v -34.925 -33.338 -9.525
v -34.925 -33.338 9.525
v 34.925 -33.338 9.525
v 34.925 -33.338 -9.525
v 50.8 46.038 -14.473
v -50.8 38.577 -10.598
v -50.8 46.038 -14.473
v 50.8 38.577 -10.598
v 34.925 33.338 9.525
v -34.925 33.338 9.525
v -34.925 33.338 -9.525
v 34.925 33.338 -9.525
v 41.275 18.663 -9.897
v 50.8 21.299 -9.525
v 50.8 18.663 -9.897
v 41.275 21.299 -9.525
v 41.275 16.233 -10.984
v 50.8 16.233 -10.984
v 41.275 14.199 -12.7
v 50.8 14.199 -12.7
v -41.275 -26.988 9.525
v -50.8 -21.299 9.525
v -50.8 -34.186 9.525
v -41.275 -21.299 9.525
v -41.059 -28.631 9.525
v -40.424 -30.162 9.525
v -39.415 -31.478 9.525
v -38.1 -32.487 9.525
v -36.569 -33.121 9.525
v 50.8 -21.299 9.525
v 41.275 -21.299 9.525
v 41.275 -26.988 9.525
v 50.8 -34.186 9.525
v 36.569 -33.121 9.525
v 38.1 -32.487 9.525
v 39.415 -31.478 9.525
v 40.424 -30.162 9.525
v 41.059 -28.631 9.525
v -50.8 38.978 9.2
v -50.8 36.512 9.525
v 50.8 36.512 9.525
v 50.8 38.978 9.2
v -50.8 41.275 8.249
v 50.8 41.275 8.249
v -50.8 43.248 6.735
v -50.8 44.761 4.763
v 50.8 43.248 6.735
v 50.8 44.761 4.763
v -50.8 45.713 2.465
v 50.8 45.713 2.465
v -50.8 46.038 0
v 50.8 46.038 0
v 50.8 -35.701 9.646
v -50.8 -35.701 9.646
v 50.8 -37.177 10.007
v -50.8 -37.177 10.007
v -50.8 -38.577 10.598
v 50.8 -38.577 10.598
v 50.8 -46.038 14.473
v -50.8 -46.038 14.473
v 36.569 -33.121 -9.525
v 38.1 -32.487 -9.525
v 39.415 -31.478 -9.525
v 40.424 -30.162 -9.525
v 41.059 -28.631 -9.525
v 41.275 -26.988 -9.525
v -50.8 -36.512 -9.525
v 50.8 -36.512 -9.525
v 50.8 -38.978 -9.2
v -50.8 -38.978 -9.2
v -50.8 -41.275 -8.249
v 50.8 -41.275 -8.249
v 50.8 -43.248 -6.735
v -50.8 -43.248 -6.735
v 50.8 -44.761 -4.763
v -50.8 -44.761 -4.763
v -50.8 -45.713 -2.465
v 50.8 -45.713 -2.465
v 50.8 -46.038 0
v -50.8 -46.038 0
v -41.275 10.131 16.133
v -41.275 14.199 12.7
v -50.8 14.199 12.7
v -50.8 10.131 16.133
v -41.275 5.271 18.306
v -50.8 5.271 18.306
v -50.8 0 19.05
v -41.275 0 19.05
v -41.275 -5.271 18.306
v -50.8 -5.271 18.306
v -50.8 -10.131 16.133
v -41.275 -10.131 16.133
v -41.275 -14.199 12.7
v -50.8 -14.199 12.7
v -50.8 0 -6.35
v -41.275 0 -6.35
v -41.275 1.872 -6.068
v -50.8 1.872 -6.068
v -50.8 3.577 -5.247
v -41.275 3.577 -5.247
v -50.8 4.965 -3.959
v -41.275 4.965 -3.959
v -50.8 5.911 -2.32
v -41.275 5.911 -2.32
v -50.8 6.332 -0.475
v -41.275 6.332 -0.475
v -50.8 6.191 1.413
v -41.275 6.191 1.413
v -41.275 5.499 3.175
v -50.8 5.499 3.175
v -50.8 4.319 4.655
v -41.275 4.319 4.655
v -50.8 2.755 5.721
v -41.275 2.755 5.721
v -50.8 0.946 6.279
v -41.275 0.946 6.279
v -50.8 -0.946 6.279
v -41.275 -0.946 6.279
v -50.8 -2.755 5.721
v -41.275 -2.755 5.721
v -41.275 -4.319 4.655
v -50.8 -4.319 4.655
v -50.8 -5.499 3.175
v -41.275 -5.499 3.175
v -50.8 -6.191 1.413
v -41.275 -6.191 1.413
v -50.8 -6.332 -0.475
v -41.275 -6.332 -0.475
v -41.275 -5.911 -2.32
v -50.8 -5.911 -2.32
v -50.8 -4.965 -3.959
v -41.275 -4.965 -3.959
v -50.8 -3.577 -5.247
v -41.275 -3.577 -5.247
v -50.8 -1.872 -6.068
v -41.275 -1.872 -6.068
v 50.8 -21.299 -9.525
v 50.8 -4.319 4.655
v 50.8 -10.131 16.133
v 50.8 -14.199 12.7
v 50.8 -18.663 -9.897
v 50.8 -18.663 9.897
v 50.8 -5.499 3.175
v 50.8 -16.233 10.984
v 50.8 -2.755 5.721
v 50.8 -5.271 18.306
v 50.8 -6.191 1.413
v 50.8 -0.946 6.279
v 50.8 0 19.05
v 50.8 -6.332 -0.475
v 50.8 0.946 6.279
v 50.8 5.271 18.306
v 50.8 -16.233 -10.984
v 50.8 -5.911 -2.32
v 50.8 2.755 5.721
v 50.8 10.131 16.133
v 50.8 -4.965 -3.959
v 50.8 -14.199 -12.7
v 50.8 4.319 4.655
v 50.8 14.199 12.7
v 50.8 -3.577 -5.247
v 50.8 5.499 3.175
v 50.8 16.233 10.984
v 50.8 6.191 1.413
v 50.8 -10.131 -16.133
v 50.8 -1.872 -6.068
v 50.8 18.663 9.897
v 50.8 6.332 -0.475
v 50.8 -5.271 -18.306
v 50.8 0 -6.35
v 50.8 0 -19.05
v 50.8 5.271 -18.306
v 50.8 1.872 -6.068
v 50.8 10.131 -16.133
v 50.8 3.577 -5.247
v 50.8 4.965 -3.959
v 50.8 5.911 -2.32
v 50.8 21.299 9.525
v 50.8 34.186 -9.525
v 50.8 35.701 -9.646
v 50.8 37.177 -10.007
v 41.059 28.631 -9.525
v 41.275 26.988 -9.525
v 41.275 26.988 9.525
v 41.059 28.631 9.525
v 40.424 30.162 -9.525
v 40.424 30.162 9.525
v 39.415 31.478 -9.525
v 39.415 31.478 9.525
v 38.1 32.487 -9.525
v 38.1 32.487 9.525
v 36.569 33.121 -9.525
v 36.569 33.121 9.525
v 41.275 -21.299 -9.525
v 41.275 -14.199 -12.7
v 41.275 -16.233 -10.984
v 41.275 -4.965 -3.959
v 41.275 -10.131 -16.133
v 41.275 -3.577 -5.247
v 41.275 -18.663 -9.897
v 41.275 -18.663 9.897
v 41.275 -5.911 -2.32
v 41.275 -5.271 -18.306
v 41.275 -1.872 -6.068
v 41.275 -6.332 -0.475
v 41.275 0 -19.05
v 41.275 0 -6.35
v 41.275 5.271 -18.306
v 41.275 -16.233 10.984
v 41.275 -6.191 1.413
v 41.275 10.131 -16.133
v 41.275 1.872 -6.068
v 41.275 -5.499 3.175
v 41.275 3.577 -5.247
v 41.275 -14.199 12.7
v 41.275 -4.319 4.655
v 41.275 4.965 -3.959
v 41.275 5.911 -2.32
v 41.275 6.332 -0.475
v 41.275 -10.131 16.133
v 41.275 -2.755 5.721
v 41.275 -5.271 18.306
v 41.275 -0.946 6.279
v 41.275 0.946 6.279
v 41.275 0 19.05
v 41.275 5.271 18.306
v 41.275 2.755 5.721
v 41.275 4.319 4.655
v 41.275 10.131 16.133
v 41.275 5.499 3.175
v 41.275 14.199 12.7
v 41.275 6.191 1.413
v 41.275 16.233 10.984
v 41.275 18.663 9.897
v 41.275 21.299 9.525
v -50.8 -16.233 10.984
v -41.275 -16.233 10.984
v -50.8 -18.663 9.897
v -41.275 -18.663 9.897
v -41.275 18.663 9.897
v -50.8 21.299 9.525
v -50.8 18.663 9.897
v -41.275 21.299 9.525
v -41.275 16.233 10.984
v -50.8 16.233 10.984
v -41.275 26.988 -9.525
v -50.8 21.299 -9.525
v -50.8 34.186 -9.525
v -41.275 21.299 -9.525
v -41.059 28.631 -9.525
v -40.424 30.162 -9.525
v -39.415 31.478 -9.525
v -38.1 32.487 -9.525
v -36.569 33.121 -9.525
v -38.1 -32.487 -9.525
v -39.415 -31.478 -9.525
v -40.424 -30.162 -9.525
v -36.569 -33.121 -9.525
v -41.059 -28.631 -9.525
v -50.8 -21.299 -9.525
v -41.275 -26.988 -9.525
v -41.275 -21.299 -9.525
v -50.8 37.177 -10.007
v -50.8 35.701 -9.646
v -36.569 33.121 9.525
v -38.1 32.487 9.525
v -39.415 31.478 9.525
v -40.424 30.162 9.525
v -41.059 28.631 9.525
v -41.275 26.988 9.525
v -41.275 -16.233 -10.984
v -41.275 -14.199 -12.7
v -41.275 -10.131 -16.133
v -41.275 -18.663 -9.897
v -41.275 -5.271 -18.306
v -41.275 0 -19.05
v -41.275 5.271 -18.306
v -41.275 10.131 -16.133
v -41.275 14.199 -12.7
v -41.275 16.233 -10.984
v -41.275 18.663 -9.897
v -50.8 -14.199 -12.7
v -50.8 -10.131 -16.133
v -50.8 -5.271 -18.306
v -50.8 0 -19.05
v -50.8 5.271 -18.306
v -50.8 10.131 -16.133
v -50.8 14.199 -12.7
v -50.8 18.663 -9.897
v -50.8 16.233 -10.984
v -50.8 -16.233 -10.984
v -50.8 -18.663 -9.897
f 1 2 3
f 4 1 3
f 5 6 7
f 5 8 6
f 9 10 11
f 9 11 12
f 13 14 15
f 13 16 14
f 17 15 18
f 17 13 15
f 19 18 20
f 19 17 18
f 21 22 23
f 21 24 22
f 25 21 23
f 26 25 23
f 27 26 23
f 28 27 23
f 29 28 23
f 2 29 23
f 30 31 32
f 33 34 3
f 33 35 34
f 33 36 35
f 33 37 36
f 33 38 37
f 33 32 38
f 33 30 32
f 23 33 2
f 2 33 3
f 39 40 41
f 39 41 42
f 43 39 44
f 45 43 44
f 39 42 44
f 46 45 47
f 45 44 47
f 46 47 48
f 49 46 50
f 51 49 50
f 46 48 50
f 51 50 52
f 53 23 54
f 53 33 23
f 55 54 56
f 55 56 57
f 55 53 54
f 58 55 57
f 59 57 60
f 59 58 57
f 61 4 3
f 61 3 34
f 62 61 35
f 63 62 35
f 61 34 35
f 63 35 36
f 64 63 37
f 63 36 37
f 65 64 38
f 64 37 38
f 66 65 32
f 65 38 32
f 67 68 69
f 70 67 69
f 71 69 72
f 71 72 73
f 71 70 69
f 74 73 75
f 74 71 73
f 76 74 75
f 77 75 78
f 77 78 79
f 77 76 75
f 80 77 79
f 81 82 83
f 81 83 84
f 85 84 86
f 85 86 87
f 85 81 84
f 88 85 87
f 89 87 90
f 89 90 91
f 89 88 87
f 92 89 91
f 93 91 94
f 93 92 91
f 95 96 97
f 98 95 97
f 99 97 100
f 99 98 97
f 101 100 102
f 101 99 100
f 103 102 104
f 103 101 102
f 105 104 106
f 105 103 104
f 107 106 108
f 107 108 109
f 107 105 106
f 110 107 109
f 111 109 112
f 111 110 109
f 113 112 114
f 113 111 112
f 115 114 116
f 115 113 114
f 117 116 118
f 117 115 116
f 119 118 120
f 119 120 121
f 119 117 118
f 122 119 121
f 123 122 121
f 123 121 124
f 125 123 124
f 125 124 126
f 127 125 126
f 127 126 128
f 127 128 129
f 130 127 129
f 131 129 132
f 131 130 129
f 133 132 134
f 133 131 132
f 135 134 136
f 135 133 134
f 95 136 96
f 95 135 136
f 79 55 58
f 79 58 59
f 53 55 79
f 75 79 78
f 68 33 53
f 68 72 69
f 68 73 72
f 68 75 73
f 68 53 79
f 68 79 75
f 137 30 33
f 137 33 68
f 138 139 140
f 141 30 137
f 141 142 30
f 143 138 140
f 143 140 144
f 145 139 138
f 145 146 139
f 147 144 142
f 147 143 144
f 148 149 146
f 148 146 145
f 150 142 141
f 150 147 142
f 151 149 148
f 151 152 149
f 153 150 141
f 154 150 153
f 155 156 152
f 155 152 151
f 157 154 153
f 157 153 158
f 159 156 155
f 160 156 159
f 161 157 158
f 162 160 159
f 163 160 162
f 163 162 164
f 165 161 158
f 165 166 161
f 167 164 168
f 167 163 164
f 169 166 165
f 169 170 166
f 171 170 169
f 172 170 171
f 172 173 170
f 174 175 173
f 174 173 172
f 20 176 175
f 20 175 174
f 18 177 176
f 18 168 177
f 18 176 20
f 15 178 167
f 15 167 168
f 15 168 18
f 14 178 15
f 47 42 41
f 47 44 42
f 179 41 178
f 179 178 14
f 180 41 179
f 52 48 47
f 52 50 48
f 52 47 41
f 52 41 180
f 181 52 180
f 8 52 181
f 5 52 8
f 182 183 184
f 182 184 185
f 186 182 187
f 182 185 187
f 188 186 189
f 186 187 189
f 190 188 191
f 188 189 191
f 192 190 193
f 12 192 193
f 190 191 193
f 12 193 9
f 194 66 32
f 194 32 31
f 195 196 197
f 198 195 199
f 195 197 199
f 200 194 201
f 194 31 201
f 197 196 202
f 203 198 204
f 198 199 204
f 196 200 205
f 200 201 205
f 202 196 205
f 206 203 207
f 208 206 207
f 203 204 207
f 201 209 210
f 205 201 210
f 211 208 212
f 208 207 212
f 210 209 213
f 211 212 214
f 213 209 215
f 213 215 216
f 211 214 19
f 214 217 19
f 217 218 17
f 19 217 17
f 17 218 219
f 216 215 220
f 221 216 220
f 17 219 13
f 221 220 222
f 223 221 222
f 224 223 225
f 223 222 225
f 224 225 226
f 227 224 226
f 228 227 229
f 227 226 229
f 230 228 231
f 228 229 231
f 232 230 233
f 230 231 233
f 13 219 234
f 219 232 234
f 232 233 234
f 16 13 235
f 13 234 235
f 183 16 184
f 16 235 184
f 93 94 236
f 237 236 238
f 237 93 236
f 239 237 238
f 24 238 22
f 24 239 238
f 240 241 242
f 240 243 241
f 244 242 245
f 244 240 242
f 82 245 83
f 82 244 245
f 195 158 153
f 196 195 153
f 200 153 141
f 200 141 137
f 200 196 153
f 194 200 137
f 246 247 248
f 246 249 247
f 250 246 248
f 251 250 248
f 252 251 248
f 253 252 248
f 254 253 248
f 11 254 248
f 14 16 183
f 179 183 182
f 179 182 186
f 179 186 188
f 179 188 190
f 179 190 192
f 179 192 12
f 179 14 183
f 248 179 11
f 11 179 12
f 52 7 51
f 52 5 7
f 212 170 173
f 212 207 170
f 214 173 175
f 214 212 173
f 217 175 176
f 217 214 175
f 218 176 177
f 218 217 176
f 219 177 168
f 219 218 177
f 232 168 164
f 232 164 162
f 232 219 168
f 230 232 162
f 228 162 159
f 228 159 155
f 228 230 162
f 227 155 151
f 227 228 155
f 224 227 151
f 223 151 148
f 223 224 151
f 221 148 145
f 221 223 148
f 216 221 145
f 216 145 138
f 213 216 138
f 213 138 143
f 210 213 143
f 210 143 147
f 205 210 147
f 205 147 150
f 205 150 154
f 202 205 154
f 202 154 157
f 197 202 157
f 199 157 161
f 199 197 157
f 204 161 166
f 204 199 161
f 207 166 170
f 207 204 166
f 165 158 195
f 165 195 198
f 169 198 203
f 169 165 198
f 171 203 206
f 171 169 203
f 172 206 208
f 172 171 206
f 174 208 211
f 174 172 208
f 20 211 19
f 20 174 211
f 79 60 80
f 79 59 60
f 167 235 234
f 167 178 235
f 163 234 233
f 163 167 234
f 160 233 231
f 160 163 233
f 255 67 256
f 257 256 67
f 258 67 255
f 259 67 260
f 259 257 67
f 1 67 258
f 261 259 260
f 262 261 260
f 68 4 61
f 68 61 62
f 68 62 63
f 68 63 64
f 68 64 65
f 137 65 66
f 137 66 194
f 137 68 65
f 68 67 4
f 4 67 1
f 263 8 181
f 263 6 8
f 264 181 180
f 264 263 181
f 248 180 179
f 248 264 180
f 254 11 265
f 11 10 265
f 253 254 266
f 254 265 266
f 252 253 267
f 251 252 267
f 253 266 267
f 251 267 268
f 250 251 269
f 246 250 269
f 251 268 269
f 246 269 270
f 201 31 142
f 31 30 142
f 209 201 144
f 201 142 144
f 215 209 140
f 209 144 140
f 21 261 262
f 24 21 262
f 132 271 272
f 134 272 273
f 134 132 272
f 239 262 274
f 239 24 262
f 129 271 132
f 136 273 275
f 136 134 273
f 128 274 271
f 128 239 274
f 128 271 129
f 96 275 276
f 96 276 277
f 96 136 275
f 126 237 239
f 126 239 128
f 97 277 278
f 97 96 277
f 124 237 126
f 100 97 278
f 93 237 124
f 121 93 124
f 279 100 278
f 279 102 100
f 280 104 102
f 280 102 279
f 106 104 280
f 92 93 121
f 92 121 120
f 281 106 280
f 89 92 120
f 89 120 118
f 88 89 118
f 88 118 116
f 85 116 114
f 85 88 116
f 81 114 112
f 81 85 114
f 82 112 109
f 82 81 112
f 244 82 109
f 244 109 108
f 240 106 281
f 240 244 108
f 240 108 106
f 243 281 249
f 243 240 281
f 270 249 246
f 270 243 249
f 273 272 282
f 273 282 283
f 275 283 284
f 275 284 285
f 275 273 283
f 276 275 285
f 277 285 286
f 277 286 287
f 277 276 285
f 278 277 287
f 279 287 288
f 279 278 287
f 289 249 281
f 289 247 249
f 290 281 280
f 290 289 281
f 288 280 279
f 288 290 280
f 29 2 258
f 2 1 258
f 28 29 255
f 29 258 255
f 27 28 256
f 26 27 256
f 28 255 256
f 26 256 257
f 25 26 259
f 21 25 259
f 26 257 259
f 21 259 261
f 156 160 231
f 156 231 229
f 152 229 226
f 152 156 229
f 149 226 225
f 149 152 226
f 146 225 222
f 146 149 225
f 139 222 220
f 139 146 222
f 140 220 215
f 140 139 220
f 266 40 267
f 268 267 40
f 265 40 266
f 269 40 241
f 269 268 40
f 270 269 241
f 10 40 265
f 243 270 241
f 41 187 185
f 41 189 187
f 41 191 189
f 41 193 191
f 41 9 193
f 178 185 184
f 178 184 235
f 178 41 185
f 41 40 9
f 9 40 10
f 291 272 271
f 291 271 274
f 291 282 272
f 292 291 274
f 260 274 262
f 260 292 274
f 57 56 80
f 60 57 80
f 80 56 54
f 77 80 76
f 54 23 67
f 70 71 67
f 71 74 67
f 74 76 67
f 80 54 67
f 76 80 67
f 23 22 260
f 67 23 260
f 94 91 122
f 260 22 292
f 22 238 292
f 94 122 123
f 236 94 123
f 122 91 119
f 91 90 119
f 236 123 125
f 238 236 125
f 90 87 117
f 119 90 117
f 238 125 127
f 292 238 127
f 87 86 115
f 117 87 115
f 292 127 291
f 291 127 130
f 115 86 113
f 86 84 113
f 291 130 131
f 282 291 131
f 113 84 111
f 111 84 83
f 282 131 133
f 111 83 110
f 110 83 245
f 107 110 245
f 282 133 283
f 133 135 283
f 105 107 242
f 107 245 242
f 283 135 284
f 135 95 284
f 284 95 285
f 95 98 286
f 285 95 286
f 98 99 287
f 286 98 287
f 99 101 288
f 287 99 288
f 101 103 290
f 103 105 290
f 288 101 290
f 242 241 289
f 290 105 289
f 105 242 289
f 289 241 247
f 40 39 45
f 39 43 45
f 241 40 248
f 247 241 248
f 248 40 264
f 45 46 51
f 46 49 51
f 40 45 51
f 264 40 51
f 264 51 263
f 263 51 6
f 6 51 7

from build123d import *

# Parameters (mm, degrees)
SKETCH1_R               = 6.35
BOSS_EXTRUDE1_DEPTH     = 50.8
SKETCH2_W               = 82.55
SKETCH2_H               = 66.675
CUT_EXTRUDE1_DEPTH      = 20.05
CUT_EXTRUDE1_DEPTH_BACK = 20.05
FILLET1_R               = 6.35
FILLET2_R               = 9.525
FILLET3_R               = 9.525
FILLET4_R               = 9.525


with BuildPart() as part:
    # Sketch1 → Boss-Extrude1 (new body, symmetric)
    with BuildSketch(Plane(origin=(0, 0, 0), x_dir=(0, 0, -1), z_dir=(1, 0, 0))):
        with BuildLine():
            Line((9.525, 36.5125), (14.473290811, 46.0375))
            Line((14.473290811, 46.0375), (-9.525, 46.0375))
            Line((-9.525, 46.0375), (-9.525, 36.5125))
            Line((-9.525, 36.5125), (-9.525, 16.497783942))
            ThreePointArc((-9.525, 16.497783942), (-19.05, 0), (-9.525, -16.497783942))
            Line((-9.525, -16.497783942), (-9.525, -36.5125))
            Line((-9.525, -36.5125), (-14.473290811, -46.0375))
            Line((-14.473290811, -46.0375), (9.525, -46.0375))
            Line((9.525, -46.0375), (9.525, -36.5125))
            Line((9.525, -36.5125), (9.525, -16.497783942))
            ThreePointArc((9.525, -16.497783942), (19.05, 0), (9.525, 16.497783942))
            Line((9.525, 16.497783942), (9.525, 36.5125))
        make_face()
        Circle(SKETCH1_R, mode=Mode.SUBTRACT)
    extrude(amount=BOSS_EXTRUDE1_DEPTH, both=True)

    # Sketch2 → Cut-Extrude1 (cut, two sides)
    with BuildSketch(Plane.XY) as cut_extrude1_sk:
        Rectangle(SKETCH2_W, SKETCH2_H)
    extrude(amount=CUT_EXTRUDE1_DEPTH, mode=Mode.SUBTRACT)
    extrude(cut_extrude1_sk.sketch, amount=-CUT_EXTRUDE1_DEPTH_BACK, mode=Mode.SUBTRACT)

    # Fillet1
    fillet1_edges = [part.edges().sort_by_distance(p)[0] for p in [
        (-41.275, 33.3375, 0),
        (41.275, -33.3375, 0),
        (41.275, 33.3375, 0),
        (-41.275, -33.3375, 0),
    ]]
    fillet(fillet1_edges, radius=FILLET1_R)

    # Fillet2
    fillet2_edges = [part.edges().sort_by_distance(p)[0] for p in [
        (46.0375, 16.497783942, -9.525),
        (46.0375, -16.497783942, -9.525),
        (46.0375, -16.497783942, 9.525),
        (46.0375, 16.497783942, 9.525),
        (-46.0375, 16.497783942, -9.525),
        (-46.0375, -16.497783942, -9.525),
        (-46.0375, -16.497783942, 9.525),
        (-46.0375, 16.497783942, 9.525),
    ]]
    fillet(fillet2_edges, radius=FILLET2_R)

    # Fillet3
    fillet3_edges = [part.edges().sort_by_distance(p)[0] for p in [
        (0, -46.0375, -9.525),
        (0, 46.0375, 9.525),
    ]]
    fillet(fillet3_edges, radius=FILLET3_R)

    # Fillet4
    fillet4_edges = [part.edges().sort_by_distance(p)[0] for p in [
        (0, -36.5125, 9.525),
        (0, 36.5125, -9.525),
    ]]
    fillet(fillet4_edges, radius=FILLET4_R)


solid = part.part
